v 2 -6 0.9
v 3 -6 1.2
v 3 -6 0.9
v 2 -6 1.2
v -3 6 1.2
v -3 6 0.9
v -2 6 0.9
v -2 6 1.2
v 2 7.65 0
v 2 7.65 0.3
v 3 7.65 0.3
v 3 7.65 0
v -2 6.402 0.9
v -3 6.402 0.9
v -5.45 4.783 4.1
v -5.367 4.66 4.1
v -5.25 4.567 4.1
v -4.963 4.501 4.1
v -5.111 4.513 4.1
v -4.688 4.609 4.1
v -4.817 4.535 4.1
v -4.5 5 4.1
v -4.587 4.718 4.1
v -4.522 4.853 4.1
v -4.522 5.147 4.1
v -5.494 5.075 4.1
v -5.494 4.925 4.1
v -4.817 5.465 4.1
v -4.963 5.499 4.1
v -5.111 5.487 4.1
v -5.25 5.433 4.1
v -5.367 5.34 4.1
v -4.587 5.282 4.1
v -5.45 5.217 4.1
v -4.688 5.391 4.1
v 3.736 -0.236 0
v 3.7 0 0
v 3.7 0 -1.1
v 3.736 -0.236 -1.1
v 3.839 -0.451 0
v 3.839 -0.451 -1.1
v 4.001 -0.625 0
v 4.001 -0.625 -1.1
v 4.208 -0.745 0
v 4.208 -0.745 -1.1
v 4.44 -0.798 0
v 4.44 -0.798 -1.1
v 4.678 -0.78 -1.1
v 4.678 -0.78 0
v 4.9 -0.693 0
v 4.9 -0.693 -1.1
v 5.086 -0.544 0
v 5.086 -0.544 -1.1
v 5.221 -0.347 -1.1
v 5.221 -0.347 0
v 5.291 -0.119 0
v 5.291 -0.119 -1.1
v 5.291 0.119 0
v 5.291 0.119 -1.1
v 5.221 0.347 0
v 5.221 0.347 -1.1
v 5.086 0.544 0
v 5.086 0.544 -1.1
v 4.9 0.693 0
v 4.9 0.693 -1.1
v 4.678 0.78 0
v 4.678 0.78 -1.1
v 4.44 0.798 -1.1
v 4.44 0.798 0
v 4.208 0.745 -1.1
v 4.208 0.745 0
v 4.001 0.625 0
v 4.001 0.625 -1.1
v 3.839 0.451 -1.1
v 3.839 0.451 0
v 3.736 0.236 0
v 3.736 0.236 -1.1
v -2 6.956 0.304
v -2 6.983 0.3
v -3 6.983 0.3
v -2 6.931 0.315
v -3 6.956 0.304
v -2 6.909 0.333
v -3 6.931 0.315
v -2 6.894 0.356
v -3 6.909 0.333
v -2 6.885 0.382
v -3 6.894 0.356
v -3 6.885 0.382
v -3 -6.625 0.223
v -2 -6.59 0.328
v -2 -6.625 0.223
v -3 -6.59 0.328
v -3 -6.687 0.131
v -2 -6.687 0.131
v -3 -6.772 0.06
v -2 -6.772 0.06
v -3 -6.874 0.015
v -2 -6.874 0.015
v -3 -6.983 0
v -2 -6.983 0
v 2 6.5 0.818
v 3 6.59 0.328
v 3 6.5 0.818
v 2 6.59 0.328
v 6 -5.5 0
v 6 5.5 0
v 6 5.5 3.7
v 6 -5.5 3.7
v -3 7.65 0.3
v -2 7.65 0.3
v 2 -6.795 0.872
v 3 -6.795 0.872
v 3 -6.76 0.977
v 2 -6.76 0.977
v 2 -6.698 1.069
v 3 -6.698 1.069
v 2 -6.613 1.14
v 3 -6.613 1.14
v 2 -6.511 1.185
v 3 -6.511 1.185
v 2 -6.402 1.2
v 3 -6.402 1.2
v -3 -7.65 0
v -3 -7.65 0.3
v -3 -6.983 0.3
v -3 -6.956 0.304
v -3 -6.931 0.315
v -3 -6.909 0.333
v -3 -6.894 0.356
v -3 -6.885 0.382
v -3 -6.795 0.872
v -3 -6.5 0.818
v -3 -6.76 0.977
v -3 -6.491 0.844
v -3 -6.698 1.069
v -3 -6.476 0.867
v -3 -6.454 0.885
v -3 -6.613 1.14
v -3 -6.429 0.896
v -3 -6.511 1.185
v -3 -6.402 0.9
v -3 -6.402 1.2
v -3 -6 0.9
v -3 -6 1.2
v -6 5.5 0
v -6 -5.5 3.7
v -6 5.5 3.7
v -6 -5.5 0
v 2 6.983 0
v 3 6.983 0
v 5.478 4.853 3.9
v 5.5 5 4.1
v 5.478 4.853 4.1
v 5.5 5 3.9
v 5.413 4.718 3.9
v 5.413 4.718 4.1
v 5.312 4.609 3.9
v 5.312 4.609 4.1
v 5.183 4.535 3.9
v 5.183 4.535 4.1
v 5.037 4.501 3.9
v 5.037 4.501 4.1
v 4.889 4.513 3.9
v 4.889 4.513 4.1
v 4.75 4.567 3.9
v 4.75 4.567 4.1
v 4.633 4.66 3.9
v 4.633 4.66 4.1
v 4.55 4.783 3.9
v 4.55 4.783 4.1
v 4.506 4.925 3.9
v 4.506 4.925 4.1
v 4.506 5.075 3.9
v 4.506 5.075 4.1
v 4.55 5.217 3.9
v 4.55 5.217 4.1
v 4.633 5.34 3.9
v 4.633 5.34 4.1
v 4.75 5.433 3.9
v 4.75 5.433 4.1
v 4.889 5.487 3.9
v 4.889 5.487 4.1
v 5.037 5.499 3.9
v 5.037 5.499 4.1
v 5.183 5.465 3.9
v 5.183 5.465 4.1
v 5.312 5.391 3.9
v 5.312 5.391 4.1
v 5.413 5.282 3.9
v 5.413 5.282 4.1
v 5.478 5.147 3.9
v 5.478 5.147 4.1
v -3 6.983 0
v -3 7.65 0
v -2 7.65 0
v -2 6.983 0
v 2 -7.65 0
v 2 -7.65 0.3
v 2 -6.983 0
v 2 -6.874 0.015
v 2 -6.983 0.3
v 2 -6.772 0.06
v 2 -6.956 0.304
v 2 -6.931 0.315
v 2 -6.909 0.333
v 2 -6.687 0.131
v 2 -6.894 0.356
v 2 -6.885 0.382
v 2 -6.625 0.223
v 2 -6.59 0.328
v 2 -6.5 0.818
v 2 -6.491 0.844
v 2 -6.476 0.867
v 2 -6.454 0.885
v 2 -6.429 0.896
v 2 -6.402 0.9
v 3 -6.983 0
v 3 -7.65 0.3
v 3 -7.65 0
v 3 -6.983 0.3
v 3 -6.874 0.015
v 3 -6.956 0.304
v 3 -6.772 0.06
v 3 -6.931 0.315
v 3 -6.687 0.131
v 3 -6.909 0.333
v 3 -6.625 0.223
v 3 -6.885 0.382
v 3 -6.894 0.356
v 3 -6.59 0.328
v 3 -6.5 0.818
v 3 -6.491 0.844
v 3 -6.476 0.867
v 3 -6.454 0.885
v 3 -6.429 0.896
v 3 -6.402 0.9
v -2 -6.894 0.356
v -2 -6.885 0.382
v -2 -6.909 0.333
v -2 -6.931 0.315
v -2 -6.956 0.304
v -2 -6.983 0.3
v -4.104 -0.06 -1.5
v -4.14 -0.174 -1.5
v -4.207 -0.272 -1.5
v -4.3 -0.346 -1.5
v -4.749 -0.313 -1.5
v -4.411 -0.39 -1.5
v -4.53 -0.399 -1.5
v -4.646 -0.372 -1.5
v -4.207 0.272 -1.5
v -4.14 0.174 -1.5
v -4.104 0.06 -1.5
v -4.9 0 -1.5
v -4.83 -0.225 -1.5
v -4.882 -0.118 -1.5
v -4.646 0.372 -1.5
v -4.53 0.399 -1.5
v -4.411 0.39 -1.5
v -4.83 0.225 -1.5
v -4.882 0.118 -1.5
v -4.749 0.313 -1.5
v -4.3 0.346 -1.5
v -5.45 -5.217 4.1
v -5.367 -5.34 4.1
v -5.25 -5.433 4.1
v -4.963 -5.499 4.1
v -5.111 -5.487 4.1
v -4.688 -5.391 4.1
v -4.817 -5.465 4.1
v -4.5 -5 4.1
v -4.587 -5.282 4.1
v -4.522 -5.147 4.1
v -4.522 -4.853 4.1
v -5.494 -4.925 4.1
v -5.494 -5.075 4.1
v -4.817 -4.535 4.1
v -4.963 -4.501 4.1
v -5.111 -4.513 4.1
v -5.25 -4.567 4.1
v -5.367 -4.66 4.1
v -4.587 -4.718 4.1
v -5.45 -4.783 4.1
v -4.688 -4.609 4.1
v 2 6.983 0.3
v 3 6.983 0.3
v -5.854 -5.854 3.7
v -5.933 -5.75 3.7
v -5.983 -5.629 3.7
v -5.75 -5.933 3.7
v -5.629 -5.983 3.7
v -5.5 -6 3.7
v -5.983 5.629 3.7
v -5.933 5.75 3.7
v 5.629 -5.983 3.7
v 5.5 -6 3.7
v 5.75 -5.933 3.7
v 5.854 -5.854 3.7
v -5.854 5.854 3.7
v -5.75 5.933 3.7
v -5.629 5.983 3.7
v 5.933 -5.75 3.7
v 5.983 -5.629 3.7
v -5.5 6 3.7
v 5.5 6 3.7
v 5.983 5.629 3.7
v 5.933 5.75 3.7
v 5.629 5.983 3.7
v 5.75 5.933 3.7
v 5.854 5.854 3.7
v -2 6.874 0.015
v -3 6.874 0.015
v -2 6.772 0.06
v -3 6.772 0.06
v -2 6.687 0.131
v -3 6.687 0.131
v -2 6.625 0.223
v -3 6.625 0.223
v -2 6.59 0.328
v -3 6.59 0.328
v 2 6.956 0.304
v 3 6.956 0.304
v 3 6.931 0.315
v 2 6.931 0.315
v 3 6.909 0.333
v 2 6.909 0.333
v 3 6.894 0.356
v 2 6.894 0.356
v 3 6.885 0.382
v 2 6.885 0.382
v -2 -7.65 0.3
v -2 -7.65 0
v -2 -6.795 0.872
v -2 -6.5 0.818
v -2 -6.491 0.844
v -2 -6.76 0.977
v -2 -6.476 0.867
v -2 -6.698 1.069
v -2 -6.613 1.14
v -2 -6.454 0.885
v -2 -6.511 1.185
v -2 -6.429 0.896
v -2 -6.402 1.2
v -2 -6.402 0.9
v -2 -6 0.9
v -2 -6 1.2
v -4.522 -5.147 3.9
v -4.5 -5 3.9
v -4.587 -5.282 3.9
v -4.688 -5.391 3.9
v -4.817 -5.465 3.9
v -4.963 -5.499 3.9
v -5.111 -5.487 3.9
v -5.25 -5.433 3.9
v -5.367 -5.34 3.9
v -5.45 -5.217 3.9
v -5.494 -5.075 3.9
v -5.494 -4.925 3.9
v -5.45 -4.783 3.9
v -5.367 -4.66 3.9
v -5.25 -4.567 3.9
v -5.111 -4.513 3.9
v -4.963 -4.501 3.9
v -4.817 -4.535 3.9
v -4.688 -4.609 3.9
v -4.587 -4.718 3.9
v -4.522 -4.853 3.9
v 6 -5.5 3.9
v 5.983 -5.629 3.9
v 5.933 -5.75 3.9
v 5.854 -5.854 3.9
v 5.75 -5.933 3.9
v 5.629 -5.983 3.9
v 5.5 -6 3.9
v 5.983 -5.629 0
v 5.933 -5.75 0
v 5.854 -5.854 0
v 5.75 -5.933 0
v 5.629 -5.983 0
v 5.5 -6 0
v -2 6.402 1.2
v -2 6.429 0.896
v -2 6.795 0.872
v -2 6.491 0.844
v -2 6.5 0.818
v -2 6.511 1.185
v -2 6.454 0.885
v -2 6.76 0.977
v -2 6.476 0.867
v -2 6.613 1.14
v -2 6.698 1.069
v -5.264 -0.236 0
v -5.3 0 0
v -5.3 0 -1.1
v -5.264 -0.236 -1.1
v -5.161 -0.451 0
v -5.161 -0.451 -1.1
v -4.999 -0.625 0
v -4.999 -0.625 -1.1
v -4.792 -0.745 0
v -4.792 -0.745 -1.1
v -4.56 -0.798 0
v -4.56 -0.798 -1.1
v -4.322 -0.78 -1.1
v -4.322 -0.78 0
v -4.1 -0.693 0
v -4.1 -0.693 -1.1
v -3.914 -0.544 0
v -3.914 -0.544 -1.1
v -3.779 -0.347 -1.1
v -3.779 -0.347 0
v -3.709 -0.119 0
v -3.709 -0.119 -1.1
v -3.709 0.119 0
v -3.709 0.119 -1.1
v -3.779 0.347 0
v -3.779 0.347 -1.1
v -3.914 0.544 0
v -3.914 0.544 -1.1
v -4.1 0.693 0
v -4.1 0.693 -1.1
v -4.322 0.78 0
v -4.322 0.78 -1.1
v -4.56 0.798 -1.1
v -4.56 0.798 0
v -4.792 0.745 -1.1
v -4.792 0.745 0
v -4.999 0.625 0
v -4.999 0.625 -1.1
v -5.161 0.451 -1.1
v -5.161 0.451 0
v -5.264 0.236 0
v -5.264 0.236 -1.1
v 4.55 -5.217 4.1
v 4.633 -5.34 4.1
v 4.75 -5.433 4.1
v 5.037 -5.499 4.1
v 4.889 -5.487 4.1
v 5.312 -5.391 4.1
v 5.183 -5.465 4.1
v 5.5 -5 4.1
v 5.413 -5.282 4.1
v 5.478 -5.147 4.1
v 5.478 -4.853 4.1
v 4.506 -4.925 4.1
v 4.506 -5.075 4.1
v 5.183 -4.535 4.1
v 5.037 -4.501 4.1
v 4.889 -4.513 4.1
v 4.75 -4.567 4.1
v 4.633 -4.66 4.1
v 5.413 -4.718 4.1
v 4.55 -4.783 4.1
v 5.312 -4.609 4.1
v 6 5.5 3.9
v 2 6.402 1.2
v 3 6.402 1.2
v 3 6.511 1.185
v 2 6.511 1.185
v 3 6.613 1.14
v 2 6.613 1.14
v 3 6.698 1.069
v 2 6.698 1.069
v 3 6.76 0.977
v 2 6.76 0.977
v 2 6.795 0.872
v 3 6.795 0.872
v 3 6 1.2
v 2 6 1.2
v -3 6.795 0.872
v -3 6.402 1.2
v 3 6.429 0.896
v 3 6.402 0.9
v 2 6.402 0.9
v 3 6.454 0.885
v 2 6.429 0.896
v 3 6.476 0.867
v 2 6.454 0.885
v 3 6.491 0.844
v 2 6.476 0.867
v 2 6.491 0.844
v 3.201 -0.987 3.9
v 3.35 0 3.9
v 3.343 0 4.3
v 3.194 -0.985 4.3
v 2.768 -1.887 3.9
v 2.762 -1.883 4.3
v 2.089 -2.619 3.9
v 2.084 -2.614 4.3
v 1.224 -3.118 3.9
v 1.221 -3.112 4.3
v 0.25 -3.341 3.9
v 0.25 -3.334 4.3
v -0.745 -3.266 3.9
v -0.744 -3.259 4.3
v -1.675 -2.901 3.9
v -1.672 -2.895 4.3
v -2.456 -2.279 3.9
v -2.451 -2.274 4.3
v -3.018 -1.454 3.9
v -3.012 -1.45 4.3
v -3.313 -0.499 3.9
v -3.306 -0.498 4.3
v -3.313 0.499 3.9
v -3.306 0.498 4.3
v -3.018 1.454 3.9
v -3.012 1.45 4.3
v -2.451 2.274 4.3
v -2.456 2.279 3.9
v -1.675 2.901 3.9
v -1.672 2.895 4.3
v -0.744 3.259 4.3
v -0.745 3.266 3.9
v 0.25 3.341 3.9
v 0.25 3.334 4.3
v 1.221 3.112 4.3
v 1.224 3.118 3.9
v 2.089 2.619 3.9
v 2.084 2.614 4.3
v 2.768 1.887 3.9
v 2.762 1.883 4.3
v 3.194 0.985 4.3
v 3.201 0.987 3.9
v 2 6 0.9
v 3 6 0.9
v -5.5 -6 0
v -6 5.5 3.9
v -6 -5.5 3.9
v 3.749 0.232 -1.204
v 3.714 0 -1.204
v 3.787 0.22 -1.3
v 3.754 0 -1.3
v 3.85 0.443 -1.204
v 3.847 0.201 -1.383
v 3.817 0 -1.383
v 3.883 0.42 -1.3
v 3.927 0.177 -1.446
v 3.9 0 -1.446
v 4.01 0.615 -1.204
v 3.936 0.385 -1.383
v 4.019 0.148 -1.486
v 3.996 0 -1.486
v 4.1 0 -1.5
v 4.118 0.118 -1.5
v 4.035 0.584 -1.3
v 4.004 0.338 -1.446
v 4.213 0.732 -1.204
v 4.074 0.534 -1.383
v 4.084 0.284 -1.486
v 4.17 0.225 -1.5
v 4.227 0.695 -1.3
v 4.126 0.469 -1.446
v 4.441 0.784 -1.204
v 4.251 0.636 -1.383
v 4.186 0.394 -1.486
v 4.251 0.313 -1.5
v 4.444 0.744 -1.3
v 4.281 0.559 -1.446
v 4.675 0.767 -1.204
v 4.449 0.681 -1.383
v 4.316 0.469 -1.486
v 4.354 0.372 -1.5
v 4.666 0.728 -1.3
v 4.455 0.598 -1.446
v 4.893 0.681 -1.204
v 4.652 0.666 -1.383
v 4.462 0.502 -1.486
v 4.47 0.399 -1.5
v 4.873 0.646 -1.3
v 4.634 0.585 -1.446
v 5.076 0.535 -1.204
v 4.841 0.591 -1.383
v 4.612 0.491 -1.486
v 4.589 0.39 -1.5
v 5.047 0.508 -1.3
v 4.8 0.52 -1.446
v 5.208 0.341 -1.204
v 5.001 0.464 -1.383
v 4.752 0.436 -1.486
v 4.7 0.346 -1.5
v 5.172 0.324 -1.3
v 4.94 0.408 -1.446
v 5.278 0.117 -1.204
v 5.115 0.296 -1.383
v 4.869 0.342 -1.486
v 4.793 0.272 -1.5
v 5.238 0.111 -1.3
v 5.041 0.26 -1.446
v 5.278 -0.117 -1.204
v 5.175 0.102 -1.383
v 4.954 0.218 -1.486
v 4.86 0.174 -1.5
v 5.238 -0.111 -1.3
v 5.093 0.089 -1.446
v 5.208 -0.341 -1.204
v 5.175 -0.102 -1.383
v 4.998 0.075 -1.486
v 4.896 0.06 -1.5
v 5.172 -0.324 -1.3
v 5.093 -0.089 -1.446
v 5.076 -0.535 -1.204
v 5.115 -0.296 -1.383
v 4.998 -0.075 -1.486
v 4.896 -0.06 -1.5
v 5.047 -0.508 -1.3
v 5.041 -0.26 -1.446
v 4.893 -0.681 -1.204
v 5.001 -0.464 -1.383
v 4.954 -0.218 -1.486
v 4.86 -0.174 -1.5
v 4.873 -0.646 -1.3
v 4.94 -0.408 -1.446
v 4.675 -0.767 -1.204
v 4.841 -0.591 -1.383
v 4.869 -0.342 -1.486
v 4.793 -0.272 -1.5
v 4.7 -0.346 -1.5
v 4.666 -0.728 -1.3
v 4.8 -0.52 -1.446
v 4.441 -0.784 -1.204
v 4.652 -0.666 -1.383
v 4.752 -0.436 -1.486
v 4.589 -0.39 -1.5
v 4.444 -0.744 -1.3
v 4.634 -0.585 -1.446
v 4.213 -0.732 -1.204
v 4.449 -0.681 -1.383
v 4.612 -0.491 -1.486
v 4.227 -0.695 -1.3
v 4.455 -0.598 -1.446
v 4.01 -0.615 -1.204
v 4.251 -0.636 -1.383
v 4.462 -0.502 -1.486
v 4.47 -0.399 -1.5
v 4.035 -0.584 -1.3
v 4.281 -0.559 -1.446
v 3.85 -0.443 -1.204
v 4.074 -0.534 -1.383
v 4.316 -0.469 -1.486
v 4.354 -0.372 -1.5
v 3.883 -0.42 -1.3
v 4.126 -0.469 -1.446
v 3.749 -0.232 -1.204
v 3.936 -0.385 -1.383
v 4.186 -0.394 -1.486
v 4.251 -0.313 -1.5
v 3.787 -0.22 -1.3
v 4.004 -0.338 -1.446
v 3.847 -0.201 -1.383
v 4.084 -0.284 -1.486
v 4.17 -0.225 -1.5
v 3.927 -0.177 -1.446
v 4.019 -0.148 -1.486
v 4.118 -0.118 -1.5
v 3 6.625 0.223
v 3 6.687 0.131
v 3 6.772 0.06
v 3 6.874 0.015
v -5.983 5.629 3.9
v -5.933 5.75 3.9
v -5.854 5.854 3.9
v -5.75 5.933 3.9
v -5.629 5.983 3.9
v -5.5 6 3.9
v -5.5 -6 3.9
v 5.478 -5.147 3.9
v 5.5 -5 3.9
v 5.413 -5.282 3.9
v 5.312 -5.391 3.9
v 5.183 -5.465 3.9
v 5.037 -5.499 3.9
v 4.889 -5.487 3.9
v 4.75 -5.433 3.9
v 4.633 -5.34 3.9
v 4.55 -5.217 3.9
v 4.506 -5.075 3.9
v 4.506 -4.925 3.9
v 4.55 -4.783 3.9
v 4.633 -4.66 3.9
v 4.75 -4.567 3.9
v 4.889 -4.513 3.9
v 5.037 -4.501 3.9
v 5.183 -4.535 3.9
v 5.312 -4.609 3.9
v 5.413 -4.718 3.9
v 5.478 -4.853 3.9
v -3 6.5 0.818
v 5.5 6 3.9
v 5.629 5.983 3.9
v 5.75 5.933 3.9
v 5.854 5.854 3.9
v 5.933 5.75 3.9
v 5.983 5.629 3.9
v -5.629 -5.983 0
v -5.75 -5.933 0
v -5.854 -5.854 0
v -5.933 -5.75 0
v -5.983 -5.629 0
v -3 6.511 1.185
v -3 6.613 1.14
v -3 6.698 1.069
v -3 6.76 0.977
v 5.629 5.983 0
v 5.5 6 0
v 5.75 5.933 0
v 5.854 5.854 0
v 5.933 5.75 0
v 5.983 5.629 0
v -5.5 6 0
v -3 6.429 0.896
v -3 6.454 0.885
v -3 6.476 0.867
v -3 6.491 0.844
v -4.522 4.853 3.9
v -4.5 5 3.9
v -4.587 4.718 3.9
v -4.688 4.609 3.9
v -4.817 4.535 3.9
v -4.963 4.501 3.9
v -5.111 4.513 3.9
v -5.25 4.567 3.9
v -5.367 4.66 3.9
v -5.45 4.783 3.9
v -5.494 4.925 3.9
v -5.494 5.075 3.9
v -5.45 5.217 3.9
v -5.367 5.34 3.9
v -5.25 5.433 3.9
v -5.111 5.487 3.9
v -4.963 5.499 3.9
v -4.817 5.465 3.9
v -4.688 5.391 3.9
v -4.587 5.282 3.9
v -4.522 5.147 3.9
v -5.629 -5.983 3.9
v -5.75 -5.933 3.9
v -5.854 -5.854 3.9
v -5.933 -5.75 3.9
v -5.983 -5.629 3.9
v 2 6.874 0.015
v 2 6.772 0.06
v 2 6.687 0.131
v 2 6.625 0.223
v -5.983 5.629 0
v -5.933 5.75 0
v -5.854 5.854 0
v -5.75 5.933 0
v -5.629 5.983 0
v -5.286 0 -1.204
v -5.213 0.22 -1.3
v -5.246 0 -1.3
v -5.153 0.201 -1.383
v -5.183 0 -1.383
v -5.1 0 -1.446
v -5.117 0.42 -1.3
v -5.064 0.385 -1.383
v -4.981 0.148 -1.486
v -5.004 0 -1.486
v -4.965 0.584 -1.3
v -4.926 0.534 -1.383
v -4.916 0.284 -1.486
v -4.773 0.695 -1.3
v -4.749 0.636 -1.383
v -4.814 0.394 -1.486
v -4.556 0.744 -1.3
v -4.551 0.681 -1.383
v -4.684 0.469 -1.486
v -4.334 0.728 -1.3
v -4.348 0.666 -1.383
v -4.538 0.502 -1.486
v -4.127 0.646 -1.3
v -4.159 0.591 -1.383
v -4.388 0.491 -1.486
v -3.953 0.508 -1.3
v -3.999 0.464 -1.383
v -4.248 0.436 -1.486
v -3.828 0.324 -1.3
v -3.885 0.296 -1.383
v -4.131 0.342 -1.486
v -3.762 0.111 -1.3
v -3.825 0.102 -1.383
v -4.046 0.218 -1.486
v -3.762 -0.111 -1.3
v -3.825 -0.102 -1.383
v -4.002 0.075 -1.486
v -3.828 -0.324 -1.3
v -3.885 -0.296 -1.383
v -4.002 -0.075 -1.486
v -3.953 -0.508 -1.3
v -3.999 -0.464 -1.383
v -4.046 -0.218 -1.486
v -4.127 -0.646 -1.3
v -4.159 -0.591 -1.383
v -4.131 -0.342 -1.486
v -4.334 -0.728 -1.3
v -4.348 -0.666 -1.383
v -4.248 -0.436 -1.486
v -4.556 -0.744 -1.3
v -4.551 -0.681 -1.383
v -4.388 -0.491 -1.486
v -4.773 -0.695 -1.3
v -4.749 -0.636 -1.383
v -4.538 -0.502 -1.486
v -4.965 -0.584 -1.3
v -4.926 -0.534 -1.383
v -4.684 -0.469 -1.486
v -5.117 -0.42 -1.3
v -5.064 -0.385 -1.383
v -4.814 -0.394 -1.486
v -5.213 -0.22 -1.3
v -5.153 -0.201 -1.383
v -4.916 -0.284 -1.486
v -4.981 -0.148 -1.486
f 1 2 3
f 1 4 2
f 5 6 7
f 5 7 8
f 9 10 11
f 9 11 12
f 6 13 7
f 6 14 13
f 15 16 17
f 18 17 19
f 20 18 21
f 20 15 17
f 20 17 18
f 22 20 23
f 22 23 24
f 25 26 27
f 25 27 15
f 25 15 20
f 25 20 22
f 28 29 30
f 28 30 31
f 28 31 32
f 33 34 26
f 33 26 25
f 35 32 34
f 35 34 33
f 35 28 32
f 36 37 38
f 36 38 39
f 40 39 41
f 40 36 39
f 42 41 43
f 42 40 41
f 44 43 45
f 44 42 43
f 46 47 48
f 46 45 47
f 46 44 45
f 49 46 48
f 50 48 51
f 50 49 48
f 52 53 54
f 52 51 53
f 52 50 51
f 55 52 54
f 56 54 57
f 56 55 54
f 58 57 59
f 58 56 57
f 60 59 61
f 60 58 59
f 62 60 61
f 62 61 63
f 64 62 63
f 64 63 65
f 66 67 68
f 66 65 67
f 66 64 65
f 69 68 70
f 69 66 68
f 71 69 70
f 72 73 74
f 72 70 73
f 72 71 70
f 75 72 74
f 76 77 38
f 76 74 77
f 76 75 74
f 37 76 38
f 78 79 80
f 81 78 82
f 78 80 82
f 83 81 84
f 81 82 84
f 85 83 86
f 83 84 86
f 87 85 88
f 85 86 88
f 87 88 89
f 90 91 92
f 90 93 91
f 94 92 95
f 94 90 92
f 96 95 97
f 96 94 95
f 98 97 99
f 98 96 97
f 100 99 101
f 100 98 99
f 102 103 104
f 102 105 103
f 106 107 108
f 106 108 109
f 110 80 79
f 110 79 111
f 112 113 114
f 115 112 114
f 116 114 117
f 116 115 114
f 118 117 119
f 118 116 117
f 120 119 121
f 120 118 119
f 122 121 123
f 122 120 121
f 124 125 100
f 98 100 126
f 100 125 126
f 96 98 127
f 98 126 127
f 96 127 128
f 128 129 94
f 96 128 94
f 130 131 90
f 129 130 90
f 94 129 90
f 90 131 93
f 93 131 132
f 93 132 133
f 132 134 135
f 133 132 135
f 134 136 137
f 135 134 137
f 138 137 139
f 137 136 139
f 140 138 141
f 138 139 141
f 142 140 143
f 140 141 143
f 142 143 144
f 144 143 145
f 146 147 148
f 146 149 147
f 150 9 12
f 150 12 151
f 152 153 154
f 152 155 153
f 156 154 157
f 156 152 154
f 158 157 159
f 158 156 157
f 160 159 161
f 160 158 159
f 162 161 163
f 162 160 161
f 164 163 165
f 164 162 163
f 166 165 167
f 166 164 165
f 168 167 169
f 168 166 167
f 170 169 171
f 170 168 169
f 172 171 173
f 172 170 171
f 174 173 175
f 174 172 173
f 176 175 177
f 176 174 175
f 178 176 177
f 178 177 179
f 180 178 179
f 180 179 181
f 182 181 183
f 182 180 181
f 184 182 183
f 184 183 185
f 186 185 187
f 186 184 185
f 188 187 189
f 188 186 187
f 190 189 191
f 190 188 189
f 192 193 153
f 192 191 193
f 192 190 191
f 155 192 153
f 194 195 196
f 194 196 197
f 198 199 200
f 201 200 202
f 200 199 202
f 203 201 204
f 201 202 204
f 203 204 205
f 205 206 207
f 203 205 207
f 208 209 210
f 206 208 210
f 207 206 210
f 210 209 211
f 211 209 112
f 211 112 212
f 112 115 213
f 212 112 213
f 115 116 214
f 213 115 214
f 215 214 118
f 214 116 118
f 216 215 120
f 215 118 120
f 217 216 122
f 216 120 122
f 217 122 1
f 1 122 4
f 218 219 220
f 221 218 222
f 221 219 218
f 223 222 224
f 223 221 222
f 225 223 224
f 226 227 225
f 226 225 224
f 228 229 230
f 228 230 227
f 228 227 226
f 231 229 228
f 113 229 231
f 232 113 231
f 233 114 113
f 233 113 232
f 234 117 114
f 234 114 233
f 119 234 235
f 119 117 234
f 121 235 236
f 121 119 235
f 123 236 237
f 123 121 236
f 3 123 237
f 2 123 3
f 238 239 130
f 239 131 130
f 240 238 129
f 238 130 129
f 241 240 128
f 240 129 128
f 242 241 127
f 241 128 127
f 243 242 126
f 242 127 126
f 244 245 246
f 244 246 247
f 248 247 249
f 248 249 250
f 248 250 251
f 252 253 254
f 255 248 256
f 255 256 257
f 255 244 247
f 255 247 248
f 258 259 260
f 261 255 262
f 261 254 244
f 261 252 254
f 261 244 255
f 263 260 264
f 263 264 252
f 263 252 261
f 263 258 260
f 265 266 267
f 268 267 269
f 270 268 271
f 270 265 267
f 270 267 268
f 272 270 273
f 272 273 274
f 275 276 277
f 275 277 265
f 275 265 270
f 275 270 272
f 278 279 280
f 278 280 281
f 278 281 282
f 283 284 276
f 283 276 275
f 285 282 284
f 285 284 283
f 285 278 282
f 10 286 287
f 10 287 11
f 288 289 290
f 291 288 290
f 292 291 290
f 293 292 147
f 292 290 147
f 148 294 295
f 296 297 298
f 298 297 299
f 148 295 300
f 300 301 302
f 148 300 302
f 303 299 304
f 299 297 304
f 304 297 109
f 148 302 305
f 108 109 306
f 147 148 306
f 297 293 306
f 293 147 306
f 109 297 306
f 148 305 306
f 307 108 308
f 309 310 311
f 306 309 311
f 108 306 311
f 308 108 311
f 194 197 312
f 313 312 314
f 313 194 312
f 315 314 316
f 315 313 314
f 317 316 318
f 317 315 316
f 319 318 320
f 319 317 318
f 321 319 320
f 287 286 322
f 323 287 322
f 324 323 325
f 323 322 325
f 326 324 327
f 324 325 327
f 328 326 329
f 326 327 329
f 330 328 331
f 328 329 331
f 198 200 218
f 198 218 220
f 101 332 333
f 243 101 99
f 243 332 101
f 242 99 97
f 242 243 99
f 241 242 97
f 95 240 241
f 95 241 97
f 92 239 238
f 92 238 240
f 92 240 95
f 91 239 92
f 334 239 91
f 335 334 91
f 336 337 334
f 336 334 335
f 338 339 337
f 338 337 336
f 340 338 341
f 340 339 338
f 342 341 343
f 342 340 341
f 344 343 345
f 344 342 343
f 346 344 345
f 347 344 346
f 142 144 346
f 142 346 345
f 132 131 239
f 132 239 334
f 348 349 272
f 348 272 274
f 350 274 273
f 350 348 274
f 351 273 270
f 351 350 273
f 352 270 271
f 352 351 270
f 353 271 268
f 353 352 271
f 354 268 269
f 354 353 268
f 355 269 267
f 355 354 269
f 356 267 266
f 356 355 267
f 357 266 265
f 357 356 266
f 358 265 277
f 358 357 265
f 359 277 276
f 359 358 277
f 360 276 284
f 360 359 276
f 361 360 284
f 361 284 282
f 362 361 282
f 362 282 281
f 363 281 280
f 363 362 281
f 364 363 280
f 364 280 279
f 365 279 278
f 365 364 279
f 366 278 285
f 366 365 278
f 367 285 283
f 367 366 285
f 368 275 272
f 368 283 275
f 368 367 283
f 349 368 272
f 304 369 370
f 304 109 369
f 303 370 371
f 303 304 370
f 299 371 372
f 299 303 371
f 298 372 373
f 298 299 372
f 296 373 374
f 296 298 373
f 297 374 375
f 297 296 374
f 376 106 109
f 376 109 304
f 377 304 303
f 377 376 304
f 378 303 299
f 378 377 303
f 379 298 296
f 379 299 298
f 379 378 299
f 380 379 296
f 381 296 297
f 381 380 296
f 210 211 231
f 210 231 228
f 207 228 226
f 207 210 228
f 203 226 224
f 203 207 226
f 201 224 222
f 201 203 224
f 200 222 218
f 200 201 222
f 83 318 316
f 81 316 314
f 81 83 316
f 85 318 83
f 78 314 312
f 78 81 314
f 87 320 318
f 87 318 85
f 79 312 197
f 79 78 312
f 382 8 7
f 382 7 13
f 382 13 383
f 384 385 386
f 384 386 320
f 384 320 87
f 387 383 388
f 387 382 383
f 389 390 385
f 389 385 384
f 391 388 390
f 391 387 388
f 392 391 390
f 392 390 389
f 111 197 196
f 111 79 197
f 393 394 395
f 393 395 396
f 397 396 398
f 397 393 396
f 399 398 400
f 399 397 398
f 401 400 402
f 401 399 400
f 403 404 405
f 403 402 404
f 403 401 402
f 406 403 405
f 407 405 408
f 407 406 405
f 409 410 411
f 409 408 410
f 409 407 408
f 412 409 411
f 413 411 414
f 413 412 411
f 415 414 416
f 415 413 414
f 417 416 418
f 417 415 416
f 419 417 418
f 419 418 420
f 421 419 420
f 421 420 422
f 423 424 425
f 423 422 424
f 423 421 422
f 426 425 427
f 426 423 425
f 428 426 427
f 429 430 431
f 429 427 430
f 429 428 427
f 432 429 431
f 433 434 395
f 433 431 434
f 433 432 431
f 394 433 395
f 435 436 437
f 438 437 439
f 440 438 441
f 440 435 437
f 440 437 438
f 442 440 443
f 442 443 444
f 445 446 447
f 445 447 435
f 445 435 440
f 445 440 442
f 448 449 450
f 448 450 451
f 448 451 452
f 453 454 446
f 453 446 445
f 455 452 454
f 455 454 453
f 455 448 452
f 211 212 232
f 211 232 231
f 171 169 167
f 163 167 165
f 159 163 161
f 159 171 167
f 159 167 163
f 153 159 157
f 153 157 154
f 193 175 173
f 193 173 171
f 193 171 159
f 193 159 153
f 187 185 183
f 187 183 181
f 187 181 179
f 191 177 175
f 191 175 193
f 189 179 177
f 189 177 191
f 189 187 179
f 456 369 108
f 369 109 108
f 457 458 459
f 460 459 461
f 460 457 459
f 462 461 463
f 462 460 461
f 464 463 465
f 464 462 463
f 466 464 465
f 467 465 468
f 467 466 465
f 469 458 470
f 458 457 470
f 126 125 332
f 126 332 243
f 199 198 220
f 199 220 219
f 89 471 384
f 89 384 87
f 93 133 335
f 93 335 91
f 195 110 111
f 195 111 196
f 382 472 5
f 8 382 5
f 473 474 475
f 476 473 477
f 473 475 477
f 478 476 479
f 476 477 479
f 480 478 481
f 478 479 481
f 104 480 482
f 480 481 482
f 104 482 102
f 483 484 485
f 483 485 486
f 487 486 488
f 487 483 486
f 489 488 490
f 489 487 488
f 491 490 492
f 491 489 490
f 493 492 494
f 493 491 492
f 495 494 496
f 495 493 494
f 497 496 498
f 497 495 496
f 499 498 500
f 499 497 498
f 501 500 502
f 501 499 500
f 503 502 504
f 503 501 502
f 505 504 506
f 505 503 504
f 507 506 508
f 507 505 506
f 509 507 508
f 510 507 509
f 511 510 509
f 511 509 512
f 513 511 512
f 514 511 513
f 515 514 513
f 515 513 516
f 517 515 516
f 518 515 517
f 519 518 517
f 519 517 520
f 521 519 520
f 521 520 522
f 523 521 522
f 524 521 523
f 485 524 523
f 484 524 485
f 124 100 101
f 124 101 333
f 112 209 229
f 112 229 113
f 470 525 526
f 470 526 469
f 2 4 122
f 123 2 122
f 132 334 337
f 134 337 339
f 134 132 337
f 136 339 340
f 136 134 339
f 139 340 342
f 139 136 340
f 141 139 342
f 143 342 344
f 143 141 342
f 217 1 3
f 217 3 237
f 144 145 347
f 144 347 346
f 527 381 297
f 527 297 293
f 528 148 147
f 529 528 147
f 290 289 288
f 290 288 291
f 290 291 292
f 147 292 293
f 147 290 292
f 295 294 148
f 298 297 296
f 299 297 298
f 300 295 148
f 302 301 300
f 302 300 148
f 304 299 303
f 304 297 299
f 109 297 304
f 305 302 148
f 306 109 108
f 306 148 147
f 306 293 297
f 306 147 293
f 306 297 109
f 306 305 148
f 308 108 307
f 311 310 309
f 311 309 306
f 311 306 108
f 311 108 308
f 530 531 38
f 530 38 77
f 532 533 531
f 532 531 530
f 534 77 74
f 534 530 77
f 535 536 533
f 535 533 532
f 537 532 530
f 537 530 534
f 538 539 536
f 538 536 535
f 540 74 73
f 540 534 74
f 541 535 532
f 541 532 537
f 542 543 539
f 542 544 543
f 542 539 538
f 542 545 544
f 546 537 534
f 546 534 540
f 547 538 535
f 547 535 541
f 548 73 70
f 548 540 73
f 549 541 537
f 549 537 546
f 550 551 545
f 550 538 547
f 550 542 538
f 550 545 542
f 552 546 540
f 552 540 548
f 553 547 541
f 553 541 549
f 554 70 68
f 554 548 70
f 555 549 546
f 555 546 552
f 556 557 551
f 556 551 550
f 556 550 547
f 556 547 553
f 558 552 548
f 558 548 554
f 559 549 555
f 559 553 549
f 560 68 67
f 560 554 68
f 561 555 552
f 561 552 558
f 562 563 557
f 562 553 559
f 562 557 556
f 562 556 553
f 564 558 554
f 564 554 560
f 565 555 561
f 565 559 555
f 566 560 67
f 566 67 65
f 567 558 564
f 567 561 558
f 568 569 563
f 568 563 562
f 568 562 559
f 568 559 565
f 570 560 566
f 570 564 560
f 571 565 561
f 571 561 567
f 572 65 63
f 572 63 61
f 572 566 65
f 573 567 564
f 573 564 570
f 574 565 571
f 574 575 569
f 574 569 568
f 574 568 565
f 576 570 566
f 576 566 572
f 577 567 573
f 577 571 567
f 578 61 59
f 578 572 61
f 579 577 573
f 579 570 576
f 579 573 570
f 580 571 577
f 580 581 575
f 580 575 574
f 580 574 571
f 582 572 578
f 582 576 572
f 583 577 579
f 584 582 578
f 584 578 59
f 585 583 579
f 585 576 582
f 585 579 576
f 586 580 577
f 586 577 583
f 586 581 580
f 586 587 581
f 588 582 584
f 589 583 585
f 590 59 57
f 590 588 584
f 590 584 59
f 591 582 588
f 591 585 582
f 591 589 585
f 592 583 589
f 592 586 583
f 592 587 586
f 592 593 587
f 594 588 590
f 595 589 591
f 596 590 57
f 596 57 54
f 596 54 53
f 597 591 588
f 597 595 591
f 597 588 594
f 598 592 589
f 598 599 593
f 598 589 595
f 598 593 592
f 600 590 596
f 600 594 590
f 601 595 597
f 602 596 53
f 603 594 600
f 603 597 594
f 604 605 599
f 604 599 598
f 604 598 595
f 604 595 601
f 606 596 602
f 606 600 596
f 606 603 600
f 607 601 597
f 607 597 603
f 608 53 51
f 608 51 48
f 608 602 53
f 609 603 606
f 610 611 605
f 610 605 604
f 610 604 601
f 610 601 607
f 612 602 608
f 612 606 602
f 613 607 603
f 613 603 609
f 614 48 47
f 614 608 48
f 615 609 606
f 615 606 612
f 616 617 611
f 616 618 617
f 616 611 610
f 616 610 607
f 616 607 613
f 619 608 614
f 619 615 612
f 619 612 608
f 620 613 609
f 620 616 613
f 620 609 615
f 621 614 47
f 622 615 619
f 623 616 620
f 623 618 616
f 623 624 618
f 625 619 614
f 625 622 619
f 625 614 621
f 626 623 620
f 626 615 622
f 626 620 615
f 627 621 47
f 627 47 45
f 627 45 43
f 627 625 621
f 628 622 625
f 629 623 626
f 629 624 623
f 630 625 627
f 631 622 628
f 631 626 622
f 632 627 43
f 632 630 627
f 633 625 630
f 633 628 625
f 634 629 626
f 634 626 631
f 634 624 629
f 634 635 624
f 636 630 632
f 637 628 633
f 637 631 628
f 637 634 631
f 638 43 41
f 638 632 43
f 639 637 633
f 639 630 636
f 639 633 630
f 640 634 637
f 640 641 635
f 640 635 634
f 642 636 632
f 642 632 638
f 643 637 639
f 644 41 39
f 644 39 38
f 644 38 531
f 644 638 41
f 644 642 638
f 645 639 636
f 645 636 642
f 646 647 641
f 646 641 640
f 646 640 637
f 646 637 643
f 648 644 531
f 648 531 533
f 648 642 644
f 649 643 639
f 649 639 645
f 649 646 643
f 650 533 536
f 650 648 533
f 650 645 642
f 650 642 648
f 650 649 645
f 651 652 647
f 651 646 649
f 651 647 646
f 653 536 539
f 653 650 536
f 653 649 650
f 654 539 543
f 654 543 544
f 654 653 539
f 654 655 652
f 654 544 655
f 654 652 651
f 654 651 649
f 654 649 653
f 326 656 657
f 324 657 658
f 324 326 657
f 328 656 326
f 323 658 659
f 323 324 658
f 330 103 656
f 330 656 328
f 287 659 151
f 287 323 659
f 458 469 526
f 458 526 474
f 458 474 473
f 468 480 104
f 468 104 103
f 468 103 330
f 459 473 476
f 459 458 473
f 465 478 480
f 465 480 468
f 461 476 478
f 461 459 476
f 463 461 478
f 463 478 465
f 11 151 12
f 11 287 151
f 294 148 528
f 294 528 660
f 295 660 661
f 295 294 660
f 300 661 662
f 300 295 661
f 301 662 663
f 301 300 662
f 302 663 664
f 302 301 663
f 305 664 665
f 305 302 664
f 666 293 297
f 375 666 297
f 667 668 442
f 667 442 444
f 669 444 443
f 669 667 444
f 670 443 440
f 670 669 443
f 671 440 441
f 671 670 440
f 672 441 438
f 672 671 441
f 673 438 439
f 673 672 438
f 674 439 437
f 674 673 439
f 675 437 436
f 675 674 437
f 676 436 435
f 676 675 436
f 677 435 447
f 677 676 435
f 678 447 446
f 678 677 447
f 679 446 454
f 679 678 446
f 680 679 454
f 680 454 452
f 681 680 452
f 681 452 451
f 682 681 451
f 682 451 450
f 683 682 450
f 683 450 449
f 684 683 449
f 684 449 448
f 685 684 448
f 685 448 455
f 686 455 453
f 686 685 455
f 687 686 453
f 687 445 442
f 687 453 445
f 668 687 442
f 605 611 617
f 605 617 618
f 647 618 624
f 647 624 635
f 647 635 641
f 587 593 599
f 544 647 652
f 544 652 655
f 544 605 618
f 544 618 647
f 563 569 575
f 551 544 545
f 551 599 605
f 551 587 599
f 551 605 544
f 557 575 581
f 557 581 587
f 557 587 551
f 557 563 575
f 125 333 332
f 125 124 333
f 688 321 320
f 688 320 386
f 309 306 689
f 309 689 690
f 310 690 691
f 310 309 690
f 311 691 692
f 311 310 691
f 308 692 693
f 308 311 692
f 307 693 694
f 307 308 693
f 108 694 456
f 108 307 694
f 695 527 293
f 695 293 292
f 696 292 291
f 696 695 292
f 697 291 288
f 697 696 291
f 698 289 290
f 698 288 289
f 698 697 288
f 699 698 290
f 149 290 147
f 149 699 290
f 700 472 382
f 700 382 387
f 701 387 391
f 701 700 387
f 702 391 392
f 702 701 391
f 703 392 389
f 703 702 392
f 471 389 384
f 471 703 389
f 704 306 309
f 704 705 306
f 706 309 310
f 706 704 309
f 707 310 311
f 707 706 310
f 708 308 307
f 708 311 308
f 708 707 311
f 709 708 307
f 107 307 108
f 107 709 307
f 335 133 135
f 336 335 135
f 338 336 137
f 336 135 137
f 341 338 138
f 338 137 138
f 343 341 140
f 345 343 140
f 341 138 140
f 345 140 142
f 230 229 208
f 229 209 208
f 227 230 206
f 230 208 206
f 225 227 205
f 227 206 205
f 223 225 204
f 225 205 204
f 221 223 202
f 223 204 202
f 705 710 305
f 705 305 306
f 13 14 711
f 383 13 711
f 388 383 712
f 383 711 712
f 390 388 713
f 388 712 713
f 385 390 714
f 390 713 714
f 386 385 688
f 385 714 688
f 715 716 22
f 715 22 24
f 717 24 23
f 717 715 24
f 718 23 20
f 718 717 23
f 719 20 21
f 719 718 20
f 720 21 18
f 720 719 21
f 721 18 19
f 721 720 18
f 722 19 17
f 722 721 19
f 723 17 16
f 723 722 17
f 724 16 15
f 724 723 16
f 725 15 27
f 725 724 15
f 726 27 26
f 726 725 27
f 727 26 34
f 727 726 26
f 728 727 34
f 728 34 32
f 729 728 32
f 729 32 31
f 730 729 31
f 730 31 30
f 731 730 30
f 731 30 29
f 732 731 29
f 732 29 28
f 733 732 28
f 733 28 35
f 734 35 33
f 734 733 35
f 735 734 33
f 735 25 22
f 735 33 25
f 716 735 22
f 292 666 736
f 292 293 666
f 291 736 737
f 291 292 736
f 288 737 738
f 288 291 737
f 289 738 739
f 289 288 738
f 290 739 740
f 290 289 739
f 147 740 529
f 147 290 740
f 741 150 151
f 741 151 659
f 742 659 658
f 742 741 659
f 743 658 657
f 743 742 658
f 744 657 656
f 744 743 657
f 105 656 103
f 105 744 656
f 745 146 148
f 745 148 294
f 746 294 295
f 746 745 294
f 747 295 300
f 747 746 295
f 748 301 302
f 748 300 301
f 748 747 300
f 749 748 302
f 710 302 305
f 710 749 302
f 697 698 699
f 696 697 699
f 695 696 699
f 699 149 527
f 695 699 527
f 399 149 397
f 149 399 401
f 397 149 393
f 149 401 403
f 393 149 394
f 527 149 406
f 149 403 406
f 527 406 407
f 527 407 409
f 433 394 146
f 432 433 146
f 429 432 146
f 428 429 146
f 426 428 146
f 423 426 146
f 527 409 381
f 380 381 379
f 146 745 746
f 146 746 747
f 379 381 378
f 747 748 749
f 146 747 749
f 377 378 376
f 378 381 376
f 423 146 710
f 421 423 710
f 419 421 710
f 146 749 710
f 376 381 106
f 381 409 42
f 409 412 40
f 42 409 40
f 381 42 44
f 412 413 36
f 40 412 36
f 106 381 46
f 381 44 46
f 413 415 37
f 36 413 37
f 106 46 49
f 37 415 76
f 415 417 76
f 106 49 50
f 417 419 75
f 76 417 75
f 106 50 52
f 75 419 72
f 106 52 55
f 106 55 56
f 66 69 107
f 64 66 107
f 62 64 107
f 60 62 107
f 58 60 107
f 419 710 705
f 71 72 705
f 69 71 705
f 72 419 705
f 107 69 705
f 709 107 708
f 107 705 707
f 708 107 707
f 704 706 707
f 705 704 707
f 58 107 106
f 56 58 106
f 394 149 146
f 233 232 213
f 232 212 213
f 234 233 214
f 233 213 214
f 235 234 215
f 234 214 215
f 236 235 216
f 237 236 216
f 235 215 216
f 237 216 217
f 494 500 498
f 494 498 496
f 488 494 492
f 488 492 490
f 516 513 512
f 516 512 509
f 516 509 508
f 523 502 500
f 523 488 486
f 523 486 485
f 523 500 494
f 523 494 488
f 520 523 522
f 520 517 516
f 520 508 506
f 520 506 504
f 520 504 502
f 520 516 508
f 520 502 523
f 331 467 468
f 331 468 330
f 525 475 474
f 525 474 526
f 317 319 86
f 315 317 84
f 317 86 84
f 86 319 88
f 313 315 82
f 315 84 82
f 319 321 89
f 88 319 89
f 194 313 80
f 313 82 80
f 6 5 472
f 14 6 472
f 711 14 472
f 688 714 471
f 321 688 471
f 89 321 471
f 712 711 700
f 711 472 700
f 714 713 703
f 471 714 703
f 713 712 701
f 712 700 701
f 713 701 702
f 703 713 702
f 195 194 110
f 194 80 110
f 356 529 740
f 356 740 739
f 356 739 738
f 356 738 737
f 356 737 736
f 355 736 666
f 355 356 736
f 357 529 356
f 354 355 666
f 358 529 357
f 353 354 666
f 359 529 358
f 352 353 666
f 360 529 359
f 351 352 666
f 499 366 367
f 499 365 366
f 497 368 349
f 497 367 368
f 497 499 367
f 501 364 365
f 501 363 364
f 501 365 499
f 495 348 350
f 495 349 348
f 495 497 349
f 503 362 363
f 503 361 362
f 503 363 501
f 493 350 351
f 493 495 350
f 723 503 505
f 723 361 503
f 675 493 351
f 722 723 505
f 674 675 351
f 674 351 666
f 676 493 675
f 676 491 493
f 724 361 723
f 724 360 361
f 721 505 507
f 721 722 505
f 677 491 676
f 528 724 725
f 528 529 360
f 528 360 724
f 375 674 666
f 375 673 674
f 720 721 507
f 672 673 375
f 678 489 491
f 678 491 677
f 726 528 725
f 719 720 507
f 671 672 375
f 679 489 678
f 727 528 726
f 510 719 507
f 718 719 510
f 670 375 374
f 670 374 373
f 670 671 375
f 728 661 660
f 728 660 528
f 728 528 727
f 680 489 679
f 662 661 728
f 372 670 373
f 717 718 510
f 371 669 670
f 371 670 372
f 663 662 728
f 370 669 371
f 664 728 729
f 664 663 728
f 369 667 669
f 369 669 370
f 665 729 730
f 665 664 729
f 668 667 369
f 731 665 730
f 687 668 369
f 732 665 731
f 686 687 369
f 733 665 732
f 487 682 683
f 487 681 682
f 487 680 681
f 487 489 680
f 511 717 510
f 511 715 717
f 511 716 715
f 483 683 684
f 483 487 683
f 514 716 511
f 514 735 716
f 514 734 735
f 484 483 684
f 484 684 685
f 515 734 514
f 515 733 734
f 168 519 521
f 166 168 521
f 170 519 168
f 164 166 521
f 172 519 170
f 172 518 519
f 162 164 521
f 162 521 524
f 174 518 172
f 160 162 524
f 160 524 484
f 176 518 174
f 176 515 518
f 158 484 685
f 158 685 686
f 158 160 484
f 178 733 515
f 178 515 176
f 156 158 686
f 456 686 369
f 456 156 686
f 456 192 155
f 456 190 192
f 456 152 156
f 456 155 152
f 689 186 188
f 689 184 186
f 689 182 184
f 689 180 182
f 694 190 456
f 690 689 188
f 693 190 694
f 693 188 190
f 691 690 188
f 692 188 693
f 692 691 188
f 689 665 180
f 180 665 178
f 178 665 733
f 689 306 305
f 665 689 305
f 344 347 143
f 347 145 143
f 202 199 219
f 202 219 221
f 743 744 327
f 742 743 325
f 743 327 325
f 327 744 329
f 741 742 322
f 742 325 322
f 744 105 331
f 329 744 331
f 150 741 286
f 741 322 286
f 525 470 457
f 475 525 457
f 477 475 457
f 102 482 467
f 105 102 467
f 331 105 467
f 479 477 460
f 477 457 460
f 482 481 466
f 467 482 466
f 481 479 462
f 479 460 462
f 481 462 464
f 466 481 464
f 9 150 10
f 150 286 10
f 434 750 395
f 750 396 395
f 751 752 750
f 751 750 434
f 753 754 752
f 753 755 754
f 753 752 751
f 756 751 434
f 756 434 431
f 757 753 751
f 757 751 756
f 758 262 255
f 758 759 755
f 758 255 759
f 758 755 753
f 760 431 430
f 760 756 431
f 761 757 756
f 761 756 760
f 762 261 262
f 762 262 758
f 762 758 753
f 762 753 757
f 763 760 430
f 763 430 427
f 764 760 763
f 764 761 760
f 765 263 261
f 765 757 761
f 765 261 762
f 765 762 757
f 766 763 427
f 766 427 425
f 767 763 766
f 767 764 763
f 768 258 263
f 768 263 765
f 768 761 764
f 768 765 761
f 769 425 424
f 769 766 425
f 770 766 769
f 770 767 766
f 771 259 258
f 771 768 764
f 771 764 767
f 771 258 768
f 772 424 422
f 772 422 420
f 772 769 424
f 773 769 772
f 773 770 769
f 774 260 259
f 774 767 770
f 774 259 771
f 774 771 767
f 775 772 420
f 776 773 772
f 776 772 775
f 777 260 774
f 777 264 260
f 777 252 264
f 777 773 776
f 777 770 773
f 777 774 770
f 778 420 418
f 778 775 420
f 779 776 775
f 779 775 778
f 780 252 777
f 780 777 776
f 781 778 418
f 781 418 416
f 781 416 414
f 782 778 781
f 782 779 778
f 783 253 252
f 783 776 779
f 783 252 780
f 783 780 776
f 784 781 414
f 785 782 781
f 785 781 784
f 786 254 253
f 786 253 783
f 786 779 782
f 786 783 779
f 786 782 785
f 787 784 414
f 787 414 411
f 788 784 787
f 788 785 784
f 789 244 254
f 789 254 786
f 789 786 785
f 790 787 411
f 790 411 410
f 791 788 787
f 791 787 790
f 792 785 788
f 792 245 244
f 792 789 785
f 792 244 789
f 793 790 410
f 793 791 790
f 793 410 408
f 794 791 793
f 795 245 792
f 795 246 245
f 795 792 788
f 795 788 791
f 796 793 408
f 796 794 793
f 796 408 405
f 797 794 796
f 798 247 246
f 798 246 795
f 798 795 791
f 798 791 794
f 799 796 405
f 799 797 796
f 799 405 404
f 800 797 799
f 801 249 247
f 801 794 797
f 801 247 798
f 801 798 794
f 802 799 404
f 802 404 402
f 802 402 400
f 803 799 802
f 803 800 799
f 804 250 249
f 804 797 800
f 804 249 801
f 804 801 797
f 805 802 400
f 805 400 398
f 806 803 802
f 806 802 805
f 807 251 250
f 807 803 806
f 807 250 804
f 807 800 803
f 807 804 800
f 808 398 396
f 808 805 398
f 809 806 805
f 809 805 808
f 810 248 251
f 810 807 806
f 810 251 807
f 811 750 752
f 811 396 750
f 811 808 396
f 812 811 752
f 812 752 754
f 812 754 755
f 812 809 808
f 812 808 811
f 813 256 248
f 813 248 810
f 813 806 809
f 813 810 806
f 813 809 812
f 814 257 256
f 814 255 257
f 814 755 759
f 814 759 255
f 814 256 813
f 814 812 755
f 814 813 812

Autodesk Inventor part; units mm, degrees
ref_plane "YZ Plane" through (0, 0, 0) normal (1, 0, 0) x (0, 1, 0)
ref_plane "XZ Plane" through (0, 0, 0) normal (0, 1, 0) x (-1, 0, 0)
ref_plane "XY Plane" through (0, 0, 0) normal (0, 0, 1) x (1, 0, 0)
sketch "Boceto39" plane through (0, 0, 0) normal (0, 0, 1) x (1, 0, 0)
  line L0 (-5.5, 6) -> (5.5, 6)
  line L1 (6, 5.5) -> (6, -5.5)
  line L2 (5.5, -6) -> (-5.5, -6)
  line L3 (-6, -5.5) -> (-6, 5.5)
  arc A0 (6, 5.5) -> (5.5, 6) centre (5.5, 5.5) ccw
  arc A1 (-5.5, 6) -> (-6, 5.5) centre (-5.5, 5.5) ccw
  arc A2 (-6, -5.5) -> (-5.5, -6) centre (-5.5, -5.5) ccw
  arc A3 (5.5, -6) -> (6, -5.5) centre (5.5, -5.5) ccw
  point P0 (0, 0)
  point P1 (-6, 6)
  point P2 (6, -6)
  point P3 (6, 6)
  point P4 (-6, -6)
  point P5 (0, 6)
  point P6 (6, 0)
  dimension "d373" = 12
  dimension "d376" = 0.5
extrude "Extrusión13" add sketch "Boceto39" along normal blind 3.7
sketch "Boceto40" plane through (0, 0, 3.7) normal (0, 0, 1) x (1, 0, 0)
  line L0 (5.5, 6) -> (-5.5, 6) projected
  arc A0 (-5.5, 6) -> (-6, 5.5) centre (-5.5, 5.5) ccw projected
  line L1 (-6, 5.5) -> (-6, -5.5) projected
  arc A1 (-6, -5.5) -> (-5.5, -6) centre (-5.5, -5.5) ccw projected
  line L2 (-5.5, -6) -> (5.5, -6) projected
  arc A2 (5.5, -6) -> (6, -5.5) centre (5.5, -5.5) ccw projected
  line L3 (6, -5.5) -> (6, 5.5) projected
  arc A3 (6, 5.5) -> (5.5, 6) centre (5.5, 5.5) ccw projected
  point P0 (0, 0)
extrude "Extrusión14" add sketch "Boceto40" along normal blind 0.2 separate body
sketch "Boceto43" plane through (0, 0, 0) normal (1, 0, 0) x (0, 1, 0)
  line L0 (0, 0) -> (0, -3.6276) construction
  line L1 (6, 0) -> (6, 3.7) construction
  line L2 (6.4016, 1.2) -> (6, 1.2)
  line L3 (5.5, 3.9) -> (-5.5, 3.9) projected
  line L4 (5.5, 0) -> (-5.5, 0) projected
  line L5 (6.4016, 0.9) -> (6, 0.9)
  line L6 (6, 0.9) -> (6, 1.2)
  arc A0 (6.5, 0.818) -> (6.4016, 0.9) centre (6.4016, 0.8) ccw
  arc A1 (6.7951, 0.8721) -> (6.4016, 1.2) centre (6.4016, 0.8) ccw
  line L7 (6.7951, 0.8721) -> (6.885, 0.382)
  line L8 (6.9833, 0.3) -> (7.65, 0.3)
  line L9 (7.65, 0.3) -> (7.65, 0)
  line L10 (7.65, 0) -> (6.9833, 0)
  line L11 (6.5899, 0.3279) -> (6.5, 0.818)
  arc A2 (6.885, 0.382) -> (6.9833, 0.3) centre (6.9833, 0.4) ccw
  arc A3 (6.5899, 0.3279) -> (6.9833, 0) centre (6.9833, 0.4) ccw
  point P0 (6.55, 1.2)
  point P1 (6.65, 0)
  dimension "d399" = 2.7
  dimension "d426" = 0.3
  dimension "d435" = 0.1
  dimension "d436" = 0.4
  dimension "d437" = 0.3
  dimension "d438" = 0.3
  dimension "d439" = 7.65
  dimension "d440" = 6.5
  dimension "d441" = 1
  dimension "d442" = 0.1
  dimension "d443" = 0.4
extrude "Extrusión15" add sketch "Boceto43" along normal mid plane 6 separate body
sketch "Boceto45" plane through (0, 0, 0) normal (1, 0, 0) x (0, 1, 0)
  line L0 (6, 1.2) -> (6.4016, 1.2) projected
  line L1 (6, 1.2) -> (8.6614, 1.2)
  line L2 (8.6614, 1.2) -> (8.6614, -2.2134)
  line L3 (8.6614, -2.2134) -> (6, -2.2134)
  line L4 (6, -2.2134) -> (6, 1.2)
  point P0 (0, 0)
  point P1 (3.3, 0.8)
extrude "Extrusión17" cut sketch "Boceto45" along normal mid plane 4 bodies 3
mirror "Simetría1" about plane through (0, 0, 0) normal (0, 1, 0) of "Extrusión15", "Extrusión17" bodies 3
sketch "Boceto48" plane through (0, 0, 0) normal (0, 1, 0) x (-1, 0, 0)
  line L0 (0, 0) -> (0, 17.1627)
  line L1 (-5.5, 3.9) -> (5.5, 3.9) construction
  line L2 (0, 3.9) -> (-3.35, 3.9)
  line L3 (-3.35, 3.9) -> (-3.343, 4.3)
  line L4 (-3.343, 4.3) -> (0, 4.3)
  line L5 (0, 4.3) -> (0, 3.9)
  line L6 (-5.5, 0) -> (5.5, 0) projected
  line L7 (-3.35, 3.9) -> (-3.35, 4.5675) construction
  dimension "d422" = 4.3
  dimension "d423" = 6.7
  dimension "d424" = 1
revolve "Revolución14" add sketch "Boceto48" angle 360 about axis through (0, 0, 0) along (0, 0, 1) bodies 2
sketch "Boceto46" plane through (0, 0, 3.9) normal (0, 0, 1) x (1, 0, 0)
  line L0 (-5, -5) -> (5, -5) construction
  line L1 (5, -5) -> (5, 5) construction
  line L2 (5, 5) -> (-5, 5) construction
  line L3 (-5, 5) -> (-5, -5) construction
  circle A0 centre (-5, -5) radius 0.5
  circle A1 centre (-5, 5) radius 0.5
  circle A2 centre (5, 5) radius 0.5
  circle A3 centre (5, -5) radius 0.5
  point P0 (0, 0)
  point P1 (0, -5)
  point P2 (-5, 0)
  dimension "d417" = 1
  dimension "d418" = 10
extrude "Extrusión18" add sketch "Boceto46" along normal blind 0.2 bodies 2
sketch "Boceto49" plane through (0, 0, 0) normal (0, 0, -1) x (-1, 0, 0)
  circle A0 centre (-4.5, 0) radius 0.8
  circle A1 centre (4.5, 0) radius 0.8
  point P0 (0, 0)
  dimension "d444" = 9
  dimension "d445" = 4.5
  dimension "d446" = 1.6
extrude "Extrusión19" add sketch "Boceto49" along normal blind 1.5 bodies 1
fillet "Empalme45" radius 0.4 2 edges at (5.3, 0, -1.5) (-3.7, 0, -1.5)
properties part number "TACT-SWITCH-SMD-12X12MM"
